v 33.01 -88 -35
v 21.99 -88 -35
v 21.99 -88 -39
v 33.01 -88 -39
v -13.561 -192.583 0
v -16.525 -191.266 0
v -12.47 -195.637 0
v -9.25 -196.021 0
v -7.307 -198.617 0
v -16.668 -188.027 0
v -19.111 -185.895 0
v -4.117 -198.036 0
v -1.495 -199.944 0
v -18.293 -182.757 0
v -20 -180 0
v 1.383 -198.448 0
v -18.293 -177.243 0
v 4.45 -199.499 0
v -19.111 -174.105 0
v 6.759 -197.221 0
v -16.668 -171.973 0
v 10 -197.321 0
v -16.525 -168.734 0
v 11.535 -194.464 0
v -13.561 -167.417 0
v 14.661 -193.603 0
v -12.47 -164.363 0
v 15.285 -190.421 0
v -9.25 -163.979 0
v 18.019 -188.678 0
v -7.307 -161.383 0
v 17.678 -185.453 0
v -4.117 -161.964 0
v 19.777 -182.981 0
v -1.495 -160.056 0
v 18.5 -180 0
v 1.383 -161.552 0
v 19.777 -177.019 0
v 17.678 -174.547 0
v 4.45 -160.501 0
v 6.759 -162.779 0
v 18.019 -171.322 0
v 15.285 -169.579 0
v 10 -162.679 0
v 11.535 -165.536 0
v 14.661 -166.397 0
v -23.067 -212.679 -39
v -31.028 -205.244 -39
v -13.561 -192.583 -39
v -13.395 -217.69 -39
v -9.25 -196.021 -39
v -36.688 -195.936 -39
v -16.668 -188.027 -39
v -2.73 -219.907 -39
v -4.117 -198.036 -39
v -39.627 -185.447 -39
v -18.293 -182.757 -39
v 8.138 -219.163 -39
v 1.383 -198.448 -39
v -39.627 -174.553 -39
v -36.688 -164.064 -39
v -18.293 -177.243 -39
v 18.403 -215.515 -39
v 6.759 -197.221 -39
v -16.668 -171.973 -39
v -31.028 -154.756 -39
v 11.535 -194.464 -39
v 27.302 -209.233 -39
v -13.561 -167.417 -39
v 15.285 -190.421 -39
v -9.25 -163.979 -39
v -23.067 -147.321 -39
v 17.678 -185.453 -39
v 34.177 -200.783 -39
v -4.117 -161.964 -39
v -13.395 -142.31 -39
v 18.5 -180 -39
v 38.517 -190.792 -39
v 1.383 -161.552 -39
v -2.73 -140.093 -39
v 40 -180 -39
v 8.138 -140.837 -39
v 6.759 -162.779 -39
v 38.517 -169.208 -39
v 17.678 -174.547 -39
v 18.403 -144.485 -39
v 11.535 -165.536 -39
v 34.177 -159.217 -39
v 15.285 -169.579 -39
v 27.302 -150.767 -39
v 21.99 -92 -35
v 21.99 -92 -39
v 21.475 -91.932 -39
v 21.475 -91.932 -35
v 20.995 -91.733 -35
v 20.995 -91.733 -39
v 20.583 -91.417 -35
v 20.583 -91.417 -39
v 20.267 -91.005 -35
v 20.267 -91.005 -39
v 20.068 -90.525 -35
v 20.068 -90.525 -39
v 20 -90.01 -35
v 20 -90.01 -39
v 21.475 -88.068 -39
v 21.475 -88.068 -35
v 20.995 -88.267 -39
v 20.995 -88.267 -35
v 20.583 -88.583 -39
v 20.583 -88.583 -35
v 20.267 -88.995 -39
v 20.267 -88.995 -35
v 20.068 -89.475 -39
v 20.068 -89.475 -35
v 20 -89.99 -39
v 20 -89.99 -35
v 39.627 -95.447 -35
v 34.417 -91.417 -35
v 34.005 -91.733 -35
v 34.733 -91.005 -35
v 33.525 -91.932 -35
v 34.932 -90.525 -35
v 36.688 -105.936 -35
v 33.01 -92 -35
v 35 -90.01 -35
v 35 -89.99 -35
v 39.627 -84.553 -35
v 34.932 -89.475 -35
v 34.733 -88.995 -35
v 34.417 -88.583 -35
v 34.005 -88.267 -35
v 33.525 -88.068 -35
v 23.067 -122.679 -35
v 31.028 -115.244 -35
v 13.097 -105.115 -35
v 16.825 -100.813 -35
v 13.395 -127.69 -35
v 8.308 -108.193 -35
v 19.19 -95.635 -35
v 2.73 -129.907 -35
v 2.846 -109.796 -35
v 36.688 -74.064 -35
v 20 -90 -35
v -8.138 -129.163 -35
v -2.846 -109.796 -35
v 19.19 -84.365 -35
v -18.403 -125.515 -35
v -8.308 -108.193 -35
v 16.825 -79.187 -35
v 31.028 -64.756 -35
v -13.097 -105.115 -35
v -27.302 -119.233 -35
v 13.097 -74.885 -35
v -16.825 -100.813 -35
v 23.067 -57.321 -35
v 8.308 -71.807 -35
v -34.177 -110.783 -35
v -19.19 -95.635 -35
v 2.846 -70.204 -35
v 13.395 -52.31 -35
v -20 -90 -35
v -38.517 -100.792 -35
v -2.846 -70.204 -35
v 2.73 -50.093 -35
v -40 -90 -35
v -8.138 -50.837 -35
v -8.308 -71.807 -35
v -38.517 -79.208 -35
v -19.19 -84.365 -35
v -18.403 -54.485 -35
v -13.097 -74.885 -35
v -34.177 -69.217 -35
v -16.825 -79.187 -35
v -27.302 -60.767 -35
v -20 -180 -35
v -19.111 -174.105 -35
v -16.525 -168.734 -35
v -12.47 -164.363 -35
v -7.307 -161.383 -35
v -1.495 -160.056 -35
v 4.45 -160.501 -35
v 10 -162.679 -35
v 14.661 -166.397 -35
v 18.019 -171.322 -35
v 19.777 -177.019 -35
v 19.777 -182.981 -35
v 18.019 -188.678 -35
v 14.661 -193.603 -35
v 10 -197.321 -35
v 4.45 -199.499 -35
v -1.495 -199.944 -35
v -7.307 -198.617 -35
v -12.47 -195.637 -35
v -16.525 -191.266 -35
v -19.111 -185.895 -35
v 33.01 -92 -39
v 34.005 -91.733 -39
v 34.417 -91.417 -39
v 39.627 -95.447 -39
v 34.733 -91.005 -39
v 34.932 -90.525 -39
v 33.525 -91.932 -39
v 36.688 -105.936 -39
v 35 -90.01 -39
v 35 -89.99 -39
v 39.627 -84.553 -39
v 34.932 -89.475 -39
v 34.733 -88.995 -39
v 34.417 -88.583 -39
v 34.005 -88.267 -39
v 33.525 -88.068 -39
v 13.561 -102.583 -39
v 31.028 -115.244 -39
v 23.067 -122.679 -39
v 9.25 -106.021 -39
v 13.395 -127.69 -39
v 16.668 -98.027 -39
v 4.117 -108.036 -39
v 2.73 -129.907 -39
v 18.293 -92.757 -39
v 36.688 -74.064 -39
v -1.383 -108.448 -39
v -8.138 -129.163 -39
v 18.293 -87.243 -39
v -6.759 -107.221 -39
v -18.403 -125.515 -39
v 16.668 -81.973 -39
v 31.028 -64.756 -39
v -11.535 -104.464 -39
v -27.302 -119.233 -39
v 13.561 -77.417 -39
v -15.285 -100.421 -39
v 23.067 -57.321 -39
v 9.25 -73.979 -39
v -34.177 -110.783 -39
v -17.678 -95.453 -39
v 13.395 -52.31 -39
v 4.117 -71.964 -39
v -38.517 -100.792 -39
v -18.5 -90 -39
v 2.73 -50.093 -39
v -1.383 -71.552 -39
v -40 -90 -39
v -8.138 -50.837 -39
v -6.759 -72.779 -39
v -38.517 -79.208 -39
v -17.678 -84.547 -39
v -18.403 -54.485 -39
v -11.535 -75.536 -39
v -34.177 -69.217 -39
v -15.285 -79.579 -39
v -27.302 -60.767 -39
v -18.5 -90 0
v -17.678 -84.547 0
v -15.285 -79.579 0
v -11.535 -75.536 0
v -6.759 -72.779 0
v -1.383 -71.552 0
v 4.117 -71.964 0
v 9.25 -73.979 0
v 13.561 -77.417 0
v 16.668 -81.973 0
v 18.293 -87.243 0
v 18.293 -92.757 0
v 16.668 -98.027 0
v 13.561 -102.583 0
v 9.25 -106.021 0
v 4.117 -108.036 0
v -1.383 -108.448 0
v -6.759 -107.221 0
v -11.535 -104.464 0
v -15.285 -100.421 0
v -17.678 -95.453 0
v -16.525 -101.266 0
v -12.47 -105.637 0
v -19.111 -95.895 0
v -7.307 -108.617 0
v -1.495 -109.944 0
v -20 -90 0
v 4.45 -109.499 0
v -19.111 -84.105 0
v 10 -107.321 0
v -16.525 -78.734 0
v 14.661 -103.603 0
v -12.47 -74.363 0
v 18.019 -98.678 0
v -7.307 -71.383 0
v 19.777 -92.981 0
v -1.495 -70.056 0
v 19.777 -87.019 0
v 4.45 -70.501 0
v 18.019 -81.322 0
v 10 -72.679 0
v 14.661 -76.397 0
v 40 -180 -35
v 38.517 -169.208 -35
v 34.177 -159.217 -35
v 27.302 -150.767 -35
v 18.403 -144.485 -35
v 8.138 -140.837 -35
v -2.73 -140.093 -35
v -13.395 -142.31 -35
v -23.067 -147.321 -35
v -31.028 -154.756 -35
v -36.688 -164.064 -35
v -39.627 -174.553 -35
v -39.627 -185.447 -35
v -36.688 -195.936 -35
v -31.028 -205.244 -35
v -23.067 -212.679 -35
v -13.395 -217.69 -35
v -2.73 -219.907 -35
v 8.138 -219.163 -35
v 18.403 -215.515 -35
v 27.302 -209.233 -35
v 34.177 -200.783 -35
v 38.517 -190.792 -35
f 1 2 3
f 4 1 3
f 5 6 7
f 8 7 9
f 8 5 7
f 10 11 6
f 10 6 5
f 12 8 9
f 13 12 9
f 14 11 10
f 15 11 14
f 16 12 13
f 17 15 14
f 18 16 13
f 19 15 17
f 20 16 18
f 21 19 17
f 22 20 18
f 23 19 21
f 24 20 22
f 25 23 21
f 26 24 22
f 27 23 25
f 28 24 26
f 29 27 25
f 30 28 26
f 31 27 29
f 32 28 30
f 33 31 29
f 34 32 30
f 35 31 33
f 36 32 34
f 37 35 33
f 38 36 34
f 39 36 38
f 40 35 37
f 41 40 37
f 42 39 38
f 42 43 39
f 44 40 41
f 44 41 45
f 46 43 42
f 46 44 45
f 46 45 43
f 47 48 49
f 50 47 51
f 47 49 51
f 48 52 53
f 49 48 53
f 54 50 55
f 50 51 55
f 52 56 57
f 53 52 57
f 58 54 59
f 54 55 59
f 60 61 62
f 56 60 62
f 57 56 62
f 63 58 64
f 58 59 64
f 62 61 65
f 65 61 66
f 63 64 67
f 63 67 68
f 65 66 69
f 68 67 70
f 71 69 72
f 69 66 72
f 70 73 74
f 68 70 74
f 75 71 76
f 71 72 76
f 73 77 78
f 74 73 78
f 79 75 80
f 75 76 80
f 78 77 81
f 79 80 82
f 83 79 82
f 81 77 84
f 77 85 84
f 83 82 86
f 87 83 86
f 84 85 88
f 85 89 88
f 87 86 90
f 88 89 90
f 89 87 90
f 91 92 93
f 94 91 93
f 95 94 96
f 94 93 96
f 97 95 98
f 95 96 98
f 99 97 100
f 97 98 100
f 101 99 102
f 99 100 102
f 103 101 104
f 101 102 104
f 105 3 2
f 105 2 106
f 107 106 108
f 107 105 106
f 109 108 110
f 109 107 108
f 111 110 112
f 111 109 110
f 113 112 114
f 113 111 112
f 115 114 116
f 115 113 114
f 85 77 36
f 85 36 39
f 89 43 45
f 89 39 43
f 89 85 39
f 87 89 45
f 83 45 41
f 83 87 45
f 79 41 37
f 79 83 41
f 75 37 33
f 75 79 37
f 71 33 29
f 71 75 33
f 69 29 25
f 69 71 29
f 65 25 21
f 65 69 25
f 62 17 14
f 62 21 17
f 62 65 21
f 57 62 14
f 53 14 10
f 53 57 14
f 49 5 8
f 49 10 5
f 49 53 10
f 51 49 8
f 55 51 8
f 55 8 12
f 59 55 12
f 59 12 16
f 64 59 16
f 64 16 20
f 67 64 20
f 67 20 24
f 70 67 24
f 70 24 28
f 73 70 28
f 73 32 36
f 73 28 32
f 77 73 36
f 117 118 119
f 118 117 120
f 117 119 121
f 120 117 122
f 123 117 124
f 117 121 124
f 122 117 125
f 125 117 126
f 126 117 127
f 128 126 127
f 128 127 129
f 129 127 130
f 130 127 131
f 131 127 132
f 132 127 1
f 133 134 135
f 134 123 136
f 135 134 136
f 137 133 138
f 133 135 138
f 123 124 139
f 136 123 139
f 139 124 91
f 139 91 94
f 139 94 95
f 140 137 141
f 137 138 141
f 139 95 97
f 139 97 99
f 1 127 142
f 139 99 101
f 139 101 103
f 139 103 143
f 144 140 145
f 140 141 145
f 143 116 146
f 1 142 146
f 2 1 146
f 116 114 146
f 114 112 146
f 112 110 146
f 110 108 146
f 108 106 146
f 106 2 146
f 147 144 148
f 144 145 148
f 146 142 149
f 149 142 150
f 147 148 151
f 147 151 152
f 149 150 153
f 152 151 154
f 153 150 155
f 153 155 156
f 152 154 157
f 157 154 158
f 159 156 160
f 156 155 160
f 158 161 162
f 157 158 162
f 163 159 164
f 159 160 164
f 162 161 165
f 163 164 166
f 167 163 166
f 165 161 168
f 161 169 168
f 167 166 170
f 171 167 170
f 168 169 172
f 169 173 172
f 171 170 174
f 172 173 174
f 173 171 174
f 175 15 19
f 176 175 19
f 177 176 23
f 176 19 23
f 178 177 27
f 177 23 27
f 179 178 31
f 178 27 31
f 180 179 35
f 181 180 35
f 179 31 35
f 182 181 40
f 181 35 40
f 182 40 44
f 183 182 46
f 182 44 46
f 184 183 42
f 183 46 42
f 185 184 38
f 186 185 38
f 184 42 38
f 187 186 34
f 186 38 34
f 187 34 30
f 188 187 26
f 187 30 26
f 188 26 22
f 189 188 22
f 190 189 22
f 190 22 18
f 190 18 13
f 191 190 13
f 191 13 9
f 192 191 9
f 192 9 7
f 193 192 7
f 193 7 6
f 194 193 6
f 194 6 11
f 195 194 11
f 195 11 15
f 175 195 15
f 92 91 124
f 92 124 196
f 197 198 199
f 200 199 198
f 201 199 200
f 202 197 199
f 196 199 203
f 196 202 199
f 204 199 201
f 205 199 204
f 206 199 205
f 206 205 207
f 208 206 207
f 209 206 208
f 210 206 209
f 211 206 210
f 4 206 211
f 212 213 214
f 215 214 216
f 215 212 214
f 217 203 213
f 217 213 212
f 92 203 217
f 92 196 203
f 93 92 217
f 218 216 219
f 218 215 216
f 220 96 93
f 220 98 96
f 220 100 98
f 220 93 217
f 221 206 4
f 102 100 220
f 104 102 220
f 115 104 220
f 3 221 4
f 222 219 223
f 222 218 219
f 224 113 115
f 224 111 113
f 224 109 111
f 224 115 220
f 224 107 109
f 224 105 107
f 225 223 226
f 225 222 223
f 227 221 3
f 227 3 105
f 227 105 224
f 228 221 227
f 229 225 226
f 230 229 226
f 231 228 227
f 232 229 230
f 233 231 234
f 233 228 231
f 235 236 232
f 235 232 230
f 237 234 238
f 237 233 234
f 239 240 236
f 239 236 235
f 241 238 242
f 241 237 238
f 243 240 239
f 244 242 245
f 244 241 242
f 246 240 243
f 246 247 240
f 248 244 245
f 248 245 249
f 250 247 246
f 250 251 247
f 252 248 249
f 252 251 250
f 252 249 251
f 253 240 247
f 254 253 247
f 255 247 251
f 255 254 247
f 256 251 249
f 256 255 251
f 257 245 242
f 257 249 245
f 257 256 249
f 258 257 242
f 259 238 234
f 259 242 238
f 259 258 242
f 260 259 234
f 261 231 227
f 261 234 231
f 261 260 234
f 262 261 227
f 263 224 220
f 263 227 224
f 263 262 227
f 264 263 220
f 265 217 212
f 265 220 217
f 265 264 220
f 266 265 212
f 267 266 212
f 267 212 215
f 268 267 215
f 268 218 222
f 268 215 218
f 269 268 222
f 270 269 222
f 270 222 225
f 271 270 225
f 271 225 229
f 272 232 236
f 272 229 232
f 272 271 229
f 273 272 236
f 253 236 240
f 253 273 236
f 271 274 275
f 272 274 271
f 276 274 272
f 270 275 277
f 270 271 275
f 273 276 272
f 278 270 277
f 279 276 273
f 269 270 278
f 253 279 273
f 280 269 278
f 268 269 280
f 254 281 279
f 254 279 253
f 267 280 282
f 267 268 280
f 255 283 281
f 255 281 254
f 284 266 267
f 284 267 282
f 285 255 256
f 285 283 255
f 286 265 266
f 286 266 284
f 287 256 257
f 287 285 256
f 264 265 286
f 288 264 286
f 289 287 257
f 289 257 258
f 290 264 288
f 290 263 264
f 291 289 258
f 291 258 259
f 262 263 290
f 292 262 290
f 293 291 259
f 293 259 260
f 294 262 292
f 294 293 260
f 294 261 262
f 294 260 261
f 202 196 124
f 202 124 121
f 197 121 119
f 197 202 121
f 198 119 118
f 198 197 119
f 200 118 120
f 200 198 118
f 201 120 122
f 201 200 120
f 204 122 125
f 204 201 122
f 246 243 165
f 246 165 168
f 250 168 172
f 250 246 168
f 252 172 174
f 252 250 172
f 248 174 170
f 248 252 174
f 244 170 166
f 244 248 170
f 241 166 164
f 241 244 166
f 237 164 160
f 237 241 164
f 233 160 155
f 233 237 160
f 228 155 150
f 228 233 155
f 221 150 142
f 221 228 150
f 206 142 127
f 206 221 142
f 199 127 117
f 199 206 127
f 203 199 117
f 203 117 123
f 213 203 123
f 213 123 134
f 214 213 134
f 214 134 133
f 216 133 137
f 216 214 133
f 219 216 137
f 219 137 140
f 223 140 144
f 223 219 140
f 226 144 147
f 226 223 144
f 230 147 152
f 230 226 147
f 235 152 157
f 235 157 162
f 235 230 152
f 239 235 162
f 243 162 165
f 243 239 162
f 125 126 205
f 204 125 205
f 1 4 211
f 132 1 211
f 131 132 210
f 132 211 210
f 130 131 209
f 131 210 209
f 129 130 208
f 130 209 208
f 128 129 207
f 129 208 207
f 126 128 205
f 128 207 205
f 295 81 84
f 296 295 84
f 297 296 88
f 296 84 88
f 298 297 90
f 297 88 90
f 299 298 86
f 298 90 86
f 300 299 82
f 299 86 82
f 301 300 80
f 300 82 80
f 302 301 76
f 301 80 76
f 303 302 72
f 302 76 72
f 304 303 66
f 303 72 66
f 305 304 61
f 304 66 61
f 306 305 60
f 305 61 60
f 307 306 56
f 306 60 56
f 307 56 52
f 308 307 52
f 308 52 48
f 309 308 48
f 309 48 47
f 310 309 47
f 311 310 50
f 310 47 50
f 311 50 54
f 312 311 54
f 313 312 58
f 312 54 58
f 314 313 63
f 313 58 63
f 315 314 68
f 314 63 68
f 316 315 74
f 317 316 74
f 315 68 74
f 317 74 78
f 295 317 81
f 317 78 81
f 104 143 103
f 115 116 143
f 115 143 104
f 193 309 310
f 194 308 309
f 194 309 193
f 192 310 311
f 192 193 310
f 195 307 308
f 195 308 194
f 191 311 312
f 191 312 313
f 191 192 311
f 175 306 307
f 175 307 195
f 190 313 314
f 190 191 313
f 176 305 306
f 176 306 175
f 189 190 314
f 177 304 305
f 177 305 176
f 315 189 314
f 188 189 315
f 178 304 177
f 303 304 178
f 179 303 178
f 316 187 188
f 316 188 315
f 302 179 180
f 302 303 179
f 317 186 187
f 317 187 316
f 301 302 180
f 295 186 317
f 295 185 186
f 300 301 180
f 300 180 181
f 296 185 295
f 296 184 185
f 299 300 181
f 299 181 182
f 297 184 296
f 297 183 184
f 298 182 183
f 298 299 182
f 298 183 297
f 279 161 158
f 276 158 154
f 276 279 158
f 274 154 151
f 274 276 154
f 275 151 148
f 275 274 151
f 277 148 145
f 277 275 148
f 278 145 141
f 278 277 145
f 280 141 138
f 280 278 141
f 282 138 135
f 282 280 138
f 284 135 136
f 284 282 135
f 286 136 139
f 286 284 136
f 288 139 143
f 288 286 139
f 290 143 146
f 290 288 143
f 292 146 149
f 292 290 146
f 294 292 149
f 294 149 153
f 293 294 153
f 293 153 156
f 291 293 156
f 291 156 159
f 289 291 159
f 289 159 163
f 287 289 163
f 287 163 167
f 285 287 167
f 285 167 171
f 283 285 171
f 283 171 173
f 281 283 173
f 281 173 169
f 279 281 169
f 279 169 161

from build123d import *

# Parameters (mm, degrees)
BOX004_W                          = 899
BOX004_H                          = 898
BOX004_DEPTH                      = 1000
BOX002_W                          = 82
BOX002_H                          = 4
BOX002_DEPTH                      = 15
FILLET001_R                       = 1.99
CYLINDER004_R                     = 18.5
CYLINDER004_DEPTH                 = 100
CYLINDER006_R                     = 20
CYLINDER006_DEPTH                 = 35
CYLINDER005_R                     = 40
CYLINDER005_DEPTH                 = 4
PART_MIRRORING003_PLACEMENT_ANGLE = 180
PART_MIRRORING004_PLACEMENT_ANGLE = 180
CUT004_PLACEMENT_ANGLE            = 90
BOX005_W                          = 899
BOX005_H                          = 898
BOX005_DEPTH                      = 1000
BOX003_W                          = 82
BOX003_H                          = 4
BOX003_DEPTH                      = 15
FILLET002_R                       = 1.99
CYLINDER008_R                     = 18.5
CYLINDER008_DEPTH                 = 100
CYLINDER007_R                     = 20
CYLINDER007_DEPTH                 = 35
CYLINDER009_R                     = 40
CYLINDER009_DEPTH                 = 4
PART_MIRRORING005_PLACEMENT_ANGLE = 180
PART_MIRRORING006_PLACEMENT_ANGLE = 180
CUT006_PLACEMENT_ANGLE            = 90


with BuildPart() as cube004:
    # Box004 → Box004 (new body)
    with BuildSketch(Plane(origin=(-72, -699, 0), x_dir=(1, 0, 0), z_dir=(0, 0, 1))):
        with Locations((449.5, 449)):
            Rectangle(BOX004_W, BOX004_H)
    extrude(amount=BOX004_DEPTH)


with BuildPart() as fillet001:
    # Box002 → Box002 (new body)
    with BuildSketch(Plane(origin=(0, -2, 20), x_dir=(1, 0, 0), z_dir=(0, 0, 1))):
        with Locations((41, 2)):
            Rectangle(BOX002_W, BOX002_H)
    extrude(amount=BOX002_DEPTH)

    # Fillet001
    fillet001_edges = [fillet001.edges().sort_by_distance(p)[0] for p in [
        (41, -2, 20),
        (41, -2, 35),
        (41, 2, 20),
        (41, 2, 35),
    ]]
    fillet(fillet001_edges, radius=FILLET001_R)


with BuildPart() as fillet001_1:
    # Fillet001 placement: moved
    add(fillet001.part.moved(Location((0, -90, 0))))


with BuildPart() as rack_straight001:
    # Cylinder004 → Cylinder004 (new body)
    with BuildSketch(Plane(origin=(-53, 0, 0), x_dir=(0, 0, -1), z_dir=(1, 0, 0))):
        Circle(CYLINDER004_R)
    extrude(amount=CYLINDER004_DEPTH)


with BuildPart() as inside001:
    # Cylinder006 → Cylinder006 (new body)
    with BuildSketch(Plane.ZY):
        Circle(CYLINDER006_R)
    extrude(amount=CYLINDER006_DEPTH)


with BuildPart() as outside001:
    # Cylinder005 → Cylinder005 (new body)
    with BuildSketch(Plane(origin=(-39, 0, 0), x_dir=(0, 0, -1), z_dir=(1, 0, 0))):
        Circle(CYLINDER005_R)
    extrude(amount=CYLINDER005_DEPTH)


with BuildPart() as part_mirroring003:
    # Part__Mirroring003: instance of outside001
    add(outside001.part.mirror(Plane(origin=(0, 0, 0), x_dir=(1, 0, 0), z_dir=(0, 1, 0))))


with BuildPart() as part_mirroring003_1:
    # Part__Mirroring003 placement: moved
    add(part_mirroring003.part.rotate(Axis((0, 0, 0), (0, 0, 1)), PART_MIRRORING003_PLACEMENT_ANGLE))


with BuildPart() as kostra2:
    # Part__Mirroring004: instance of inside001
    add(inside001.part.mirror(Plane(origin=(0, 0, 0), x_dir=(1, 0, 0), z_dir=(0, 1, 0))))


with BuildPart() as kostra2_1:
    # Part__Mirroring004 placement: moved
    add(kostra2.part.rotate(Axis((0, 0, 0), (0, 1, 0)), PART_MIRRORING004_PLACEMENT_ANGLE))

    # Fusion001: union inside001, Part__Mirroring003, outside001
    add(inside001.part)
    add(part_mirroring003_1.part)
    add(outside001.part)

    # Cut003: cut rack_straight001
    add(rack_straight001.part, mode=Mode.SUBTRACT)


with BuildPart() as kostra2_2:
    # Cut003 placement: moved
    add(kostra2_1.part.moved(Location((0, -90, 0))))

    # Cut004: cut Fillet001
    add(fillet001_1.part, mode=Mode.SUBTRACT)


with BuildPart() as kostra2_3:
    # Cut004 placement: moved
    add(kostra2_2.part.rotate(Axis((0, 0, 0), (0, 1, 0)), CUT004_PLACEMENT_ANGLE))

    # Cut007: cut Cube004
    add(cube004.part, mode=Mode.SUBTRACT)


with BuildPart() as cube005:
    # Box005 → Box005 (new body)
    with BuildSketch(Plane(origin=(-72, -699, 0), x_dir=(1, 0, 0), z_dir=(0, 0, 1))):
        with Locations((449.5, 449)):
            Rectangle(BOX005_W, BOX005_H)
    extrude(amount=BOX005_DEPTH)


with BuildPart() as fillet002:
    # Box003 → Box003 (new body)
    with BuildSketch(Plane(origin=(0, -2, 20), x_dir=(1, 0, 0), z_dir=(0, 0, 1))):
        with Locations((41, 2)):
            Rectangle(BOX003_W, BOX003_H)
    extrude(amount=BOX003_DEPTH)

    # Fillet002
    fillet002_edges = [fillet002.edges().sort_by_distance(p)[0] for p in [
        (41, -2, 20),
        (41, -2, 35),
        (41, 2, 20),
        (41, 2, 35),
    ]]
    fillet(fillet002_edges, radius=FILLET002_R)


with BuildPart() as fillet002_1:
    # Fillet002 placement: moved
    add(fillet002.part.moved(Location((0, -90, 0))))


with BuildPart() as rack_straight002:
    # Cylinder008 → Cylinder008 (new body)
    with BuildSketch(Plane(origin=(-53, 0, 0), x_dir=(0, 0, -1), z_dir=(1, 0, 0))):
        Circle(CYLINDER008_R)
    extrude(amount=CYLINDER008_DEPTH)


with BuildPart() as inside002:
    # Cylinder007 → Cylinder007 (new body)
    with BuildSketch(Plane.ZY):
        Circle(CYLINDER007_R)
    extrude(amount=CYLINDER007_DEPTH)


with BuildPart() as outside002:
    # Cylinder009 → Cylinder009 (new body)
    with BuildSketch(Plane(origin=(-39, 0, 0), x_dir=(0, 0, -1), z_dir=(1, 0, 0))):
        Circle(CYLINDER009_R)
    extrude(amount=CYLINDER009_DEPTH)


with BuildPart() as part_mirroring005:
    # Part__Mirroring005: instance of outside002
    add(outside002.part.mirror(Plane(origin=(0, 0, 0), x_dir=(1, 0, 0), z_dir=(0, 1, 0))))


with BuildPart() as part_mirroring005_1:
    # Part__Mirroring005 placement: moved
    add(part_mirroring005.part.rotate(Axis((0, 0, 0), (0, 0, 1)), PART_MIRRORING005_PLACEMENT_ANGLE))


with BuildPart() as kostra1:
    # Part__Mirroring006: instance of inside002
    add(inside002.part.mirror(Plane(origin=(0, 0, 0), x_dir=(1, 0, 0), z_dir=(0, 1, 0))))


with BuildPart() as kostra1_1:
    # Part__Mirroring006 placement: moved
    add(kostra1.part.rotate(Axis((0, 0, 0), (0, 1, 0)), PART_MIRRORING006_PLACEMENT_ANGLE))

    # Fusion002: union inside002, Part__Mirroring005, outside002
    add(inside002.part)
    add(part_mirroring005_1.part)
    add(outside002.part)

    # Cut005: cut rack_straight002
    add(rack_straight002.part, mode=Mode.SUBTRACT)


with BuildPart() as kostra1_2:
    # Cut005 placement: moved
    add(kostra1_1.part.moved(Location((0, -90, 0))))

    # Cut006: cut Fillet002
    add(fillet002_1.part, mode=Mode.SUBTRACT)


with BuildPart() as kostra1_3:
    # Cut006 placement: moved
    add(kostra1_2.part.moved(Location((0, -90, 0))).rotate(Axis((0, -90, 0), (0, -1, 0)), CUT006_PLACEMENT_ANGLE))

    # Cut008: cut Cube005
    add(cube005.part, mode=Mode.SUBTRACT)


solid = Compound([kostra2_3.part, kostra1_3.part])
